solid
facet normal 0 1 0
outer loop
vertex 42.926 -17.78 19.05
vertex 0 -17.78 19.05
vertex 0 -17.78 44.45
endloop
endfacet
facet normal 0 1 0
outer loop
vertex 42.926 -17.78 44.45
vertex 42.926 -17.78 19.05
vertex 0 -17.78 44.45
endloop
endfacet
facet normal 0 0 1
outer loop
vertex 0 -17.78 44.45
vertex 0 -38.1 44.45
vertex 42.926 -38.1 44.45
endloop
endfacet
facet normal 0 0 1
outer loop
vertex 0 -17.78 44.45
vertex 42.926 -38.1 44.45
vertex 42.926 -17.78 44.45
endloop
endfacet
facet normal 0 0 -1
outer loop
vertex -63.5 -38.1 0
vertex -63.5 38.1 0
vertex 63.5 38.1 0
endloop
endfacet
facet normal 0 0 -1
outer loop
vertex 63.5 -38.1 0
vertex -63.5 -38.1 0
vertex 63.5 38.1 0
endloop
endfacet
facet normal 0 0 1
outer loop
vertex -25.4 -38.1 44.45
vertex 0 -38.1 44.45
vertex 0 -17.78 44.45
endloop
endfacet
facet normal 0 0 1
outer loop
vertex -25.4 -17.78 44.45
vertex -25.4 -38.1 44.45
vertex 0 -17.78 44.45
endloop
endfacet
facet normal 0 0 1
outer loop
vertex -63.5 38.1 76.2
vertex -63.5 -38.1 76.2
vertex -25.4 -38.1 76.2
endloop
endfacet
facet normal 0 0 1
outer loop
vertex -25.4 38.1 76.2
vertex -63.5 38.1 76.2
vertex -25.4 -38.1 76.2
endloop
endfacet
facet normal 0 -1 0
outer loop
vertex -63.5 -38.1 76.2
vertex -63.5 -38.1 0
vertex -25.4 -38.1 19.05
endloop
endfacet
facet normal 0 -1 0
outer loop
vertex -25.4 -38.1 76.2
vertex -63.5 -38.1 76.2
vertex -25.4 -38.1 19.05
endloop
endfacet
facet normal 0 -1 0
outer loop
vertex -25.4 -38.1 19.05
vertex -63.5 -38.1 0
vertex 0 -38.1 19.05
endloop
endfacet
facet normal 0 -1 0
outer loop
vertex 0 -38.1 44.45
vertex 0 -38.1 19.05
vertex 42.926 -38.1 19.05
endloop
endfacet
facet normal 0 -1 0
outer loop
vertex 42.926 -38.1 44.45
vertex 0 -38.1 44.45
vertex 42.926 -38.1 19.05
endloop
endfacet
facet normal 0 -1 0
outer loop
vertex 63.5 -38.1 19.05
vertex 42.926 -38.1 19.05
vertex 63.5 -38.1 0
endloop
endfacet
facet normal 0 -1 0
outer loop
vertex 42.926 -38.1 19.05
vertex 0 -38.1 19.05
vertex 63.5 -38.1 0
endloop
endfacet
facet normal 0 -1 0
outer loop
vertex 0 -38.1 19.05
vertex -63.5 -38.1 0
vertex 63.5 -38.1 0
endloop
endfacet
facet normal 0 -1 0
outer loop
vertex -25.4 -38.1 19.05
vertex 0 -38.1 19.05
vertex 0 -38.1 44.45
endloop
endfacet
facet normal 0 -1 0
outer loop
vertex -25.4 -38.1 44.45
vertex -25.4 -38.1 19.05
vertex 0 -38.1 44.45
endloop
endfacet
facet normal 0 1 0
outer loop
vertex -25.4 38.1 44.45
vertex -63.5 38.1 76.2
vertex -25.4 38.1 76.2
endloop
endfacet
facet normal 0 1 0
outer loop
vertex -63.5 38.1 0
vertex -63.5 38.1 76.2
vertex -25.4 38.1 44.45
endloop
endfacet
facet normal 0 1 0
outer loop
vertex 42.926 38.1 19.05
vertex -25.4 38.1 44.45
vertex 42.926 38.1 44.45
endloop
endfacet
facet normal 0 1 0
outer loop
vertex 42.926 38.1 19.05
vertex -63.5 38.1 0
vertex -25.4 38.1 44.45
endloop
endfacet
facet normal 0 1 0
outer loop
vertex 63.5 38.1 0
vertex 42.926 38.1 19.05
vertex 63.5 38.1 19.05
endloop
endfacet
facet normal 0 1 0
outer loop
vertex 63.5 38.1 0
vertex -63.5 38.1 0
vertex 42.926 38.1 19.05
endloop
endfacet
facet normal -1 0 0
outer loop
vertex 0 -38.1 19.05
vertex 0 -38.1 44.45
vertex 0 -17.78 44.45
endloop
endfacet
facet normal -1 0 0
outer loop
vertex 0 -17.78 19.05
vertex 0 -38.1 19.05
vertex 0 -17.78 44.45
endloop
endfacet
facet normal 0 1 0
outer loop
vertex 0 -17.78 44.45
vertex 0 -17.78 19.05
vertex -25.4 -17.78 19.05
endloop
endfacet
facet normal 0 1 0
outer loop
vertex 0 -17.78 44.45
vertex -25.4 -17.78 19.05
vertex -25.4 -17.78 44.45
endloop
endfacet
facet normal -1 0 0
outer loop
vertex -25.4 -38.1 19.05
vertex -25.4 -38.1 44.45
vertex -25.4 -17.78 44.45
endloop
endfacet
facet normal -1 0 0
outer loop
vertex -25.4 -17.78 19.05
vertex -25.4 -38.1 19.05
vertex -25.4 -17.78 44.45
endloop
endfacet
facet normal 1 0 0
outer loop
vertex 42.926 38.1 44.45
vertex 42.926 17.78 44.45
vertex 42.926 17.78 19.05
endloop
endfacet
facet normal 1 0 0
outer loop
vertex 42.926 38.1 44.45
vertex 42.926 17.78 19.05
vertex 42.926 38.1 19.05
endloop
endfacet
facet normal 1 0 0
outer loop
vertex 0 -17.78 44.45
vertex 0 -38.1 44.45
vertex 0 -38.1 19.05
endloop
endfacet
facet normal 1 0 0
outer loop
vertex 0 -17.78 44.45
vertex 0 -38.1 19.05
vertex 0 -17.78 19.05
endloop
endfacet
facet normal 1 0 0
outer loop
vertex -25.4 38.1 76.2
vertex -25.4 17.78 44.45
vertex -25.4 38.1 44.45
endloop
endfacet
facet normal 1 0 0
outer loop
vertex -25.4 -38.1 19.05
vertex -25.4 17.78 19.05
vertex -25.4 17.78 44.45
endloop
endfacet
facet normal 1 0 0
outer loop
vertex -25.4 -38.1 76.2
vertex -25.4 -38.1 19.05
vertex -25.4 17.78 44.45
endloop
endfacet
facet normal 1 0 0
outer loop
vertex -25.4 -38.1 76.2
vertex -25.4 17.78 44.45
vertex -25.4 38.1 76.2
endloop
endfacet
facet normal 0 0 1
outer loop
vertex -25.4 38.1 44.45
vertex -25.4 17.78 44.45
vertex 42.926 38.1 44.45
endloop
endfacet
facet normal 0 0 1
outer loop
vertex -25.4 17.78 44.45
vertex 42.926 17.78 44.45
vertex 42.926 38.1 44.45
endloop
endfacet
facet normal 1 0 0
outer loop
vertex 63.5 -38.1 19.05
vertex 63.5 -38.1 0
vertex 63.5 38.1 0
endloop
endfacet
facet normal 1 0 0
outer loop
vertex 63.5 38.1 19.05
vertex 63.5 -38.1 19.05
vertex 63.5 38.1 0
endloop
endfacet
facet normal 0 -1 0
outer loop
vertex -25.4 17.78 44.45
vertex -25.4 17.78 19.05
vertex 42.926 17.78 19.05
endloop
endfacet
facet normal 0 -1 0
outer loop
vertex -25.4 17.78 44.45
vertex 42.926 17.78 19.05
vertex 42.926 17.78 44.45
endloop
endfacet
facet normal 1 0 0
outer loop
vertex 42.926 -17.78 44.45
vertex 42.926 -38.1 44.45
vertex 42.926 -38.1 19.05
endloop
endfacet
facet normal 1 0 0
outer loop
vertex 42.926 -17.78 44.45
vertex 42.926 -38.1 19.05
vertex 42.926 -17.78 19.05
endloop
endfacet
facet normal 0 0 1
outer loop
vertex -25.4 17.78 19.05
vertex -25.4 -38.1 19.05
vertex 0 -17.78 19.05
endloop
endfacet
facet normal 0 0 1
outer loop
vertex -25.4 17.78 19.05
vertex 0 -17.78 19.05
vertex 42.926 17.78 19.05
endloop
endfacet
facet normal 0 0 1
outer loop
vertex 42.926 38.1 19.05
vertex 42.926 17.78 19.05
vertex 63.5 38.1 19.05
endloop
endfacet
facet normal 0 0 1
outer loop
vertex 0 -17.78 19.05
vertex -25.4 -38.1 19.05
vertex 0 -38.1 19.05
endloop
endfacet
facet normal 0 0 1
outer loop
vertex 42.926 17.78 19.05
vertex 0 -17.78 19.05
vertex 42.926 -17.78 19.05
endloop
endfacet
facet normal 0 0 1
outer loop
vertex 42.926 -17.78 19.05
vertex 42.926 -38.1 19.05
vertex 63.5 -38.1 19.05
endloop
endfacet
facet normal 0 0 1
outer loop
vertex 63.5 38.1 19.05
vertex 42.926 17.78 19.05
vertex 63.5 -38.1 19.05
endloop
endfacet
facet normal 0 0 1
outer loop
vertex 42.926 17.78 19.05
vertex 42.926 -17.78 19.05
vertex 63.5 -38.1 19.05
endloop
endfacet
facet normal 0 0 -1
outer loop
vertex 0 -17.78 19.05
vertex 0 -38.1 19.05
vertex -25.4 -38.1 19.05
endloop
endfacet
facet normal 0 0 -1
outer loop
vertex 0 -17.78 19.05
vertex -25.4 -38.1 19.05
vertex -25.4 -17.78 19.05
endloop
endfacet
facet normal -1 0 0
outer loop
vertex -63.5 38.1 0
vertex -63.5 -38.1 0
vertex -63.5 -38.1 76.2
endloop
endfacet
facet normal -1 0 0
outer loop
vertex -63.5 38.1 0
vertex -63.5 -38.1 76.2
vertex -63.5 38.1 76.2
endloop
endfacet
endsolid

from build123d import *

# Parameters (mm, degrees)
F0_W     = 127
F0_H     = 76.2
F1_DEPTH = 76.2
F2_W     = 151.7542588233
F2_H     = 68.3967312743
F3_DEPTH = 59.182
F4_W     = 20.32
F4_H     = 25.4
F5_DEPTH = 42.926
F6_DEPTH = 25.4
F7_W     = 20.32
F7_H     = 25.4
F8_DEPTH = 42.926
F9_DEPTH = 25.4


with BuildPart() as f1:
    # F0 (on Top) → F1 (new body)
    with BuildSketch(Plane.XY):
        Rectangle(F0_W, F0_H)
    extrude(amount=F1_DEPTH)

    # F2 (on Front) → F3 (cut, symmetric)
    with BuildSketch(Plane.XZ):
        with Locations((50.4771294116, 53.2483656372)):
            Rectangle(F2_W, F2_H)
    extrude(amount=F3_DEPTH, both=True, mode=Mode.SUBTRACT)

    # F4 (on Right) → F5 (join)
    with BuildSketch(Plane.YZ):
        with Locations((-27.94, 31.75)):
            Rectangle(F4_W, F4_H)
    extrude(amount=F5_DEPTH)


with BuildPart() as f6:
    # F6 (new, through all): a face of the model
    f6_faces = [f1.part.faces().sort_by_distance(p)[0] for p in [
        (0, -27.94, 31.75),
    ]]
    extrude(f6_faces, amount=F6_DEPTH)


with BuildPart() as f1_1:
    add(f1.part)

    # F7 (on Right) → F8 (join)
    with BuildSketch(Plane.YZ):
        with Locations((27.94, 31.75)):
            Rectangle(F7_W, F7_H)
    extrude(amount=F8_DEPTH)

    # F9 (add, through all): a face of the model
    f9_faces = [f1_1.faces().sort_by_distance(p)[0] for p in [
        (0, 27.94, 31.75),
    ]]
    extrude(f9_faces, amount=F9_DEPTH)


solid = Compound([f6.part, f1_1.part])
